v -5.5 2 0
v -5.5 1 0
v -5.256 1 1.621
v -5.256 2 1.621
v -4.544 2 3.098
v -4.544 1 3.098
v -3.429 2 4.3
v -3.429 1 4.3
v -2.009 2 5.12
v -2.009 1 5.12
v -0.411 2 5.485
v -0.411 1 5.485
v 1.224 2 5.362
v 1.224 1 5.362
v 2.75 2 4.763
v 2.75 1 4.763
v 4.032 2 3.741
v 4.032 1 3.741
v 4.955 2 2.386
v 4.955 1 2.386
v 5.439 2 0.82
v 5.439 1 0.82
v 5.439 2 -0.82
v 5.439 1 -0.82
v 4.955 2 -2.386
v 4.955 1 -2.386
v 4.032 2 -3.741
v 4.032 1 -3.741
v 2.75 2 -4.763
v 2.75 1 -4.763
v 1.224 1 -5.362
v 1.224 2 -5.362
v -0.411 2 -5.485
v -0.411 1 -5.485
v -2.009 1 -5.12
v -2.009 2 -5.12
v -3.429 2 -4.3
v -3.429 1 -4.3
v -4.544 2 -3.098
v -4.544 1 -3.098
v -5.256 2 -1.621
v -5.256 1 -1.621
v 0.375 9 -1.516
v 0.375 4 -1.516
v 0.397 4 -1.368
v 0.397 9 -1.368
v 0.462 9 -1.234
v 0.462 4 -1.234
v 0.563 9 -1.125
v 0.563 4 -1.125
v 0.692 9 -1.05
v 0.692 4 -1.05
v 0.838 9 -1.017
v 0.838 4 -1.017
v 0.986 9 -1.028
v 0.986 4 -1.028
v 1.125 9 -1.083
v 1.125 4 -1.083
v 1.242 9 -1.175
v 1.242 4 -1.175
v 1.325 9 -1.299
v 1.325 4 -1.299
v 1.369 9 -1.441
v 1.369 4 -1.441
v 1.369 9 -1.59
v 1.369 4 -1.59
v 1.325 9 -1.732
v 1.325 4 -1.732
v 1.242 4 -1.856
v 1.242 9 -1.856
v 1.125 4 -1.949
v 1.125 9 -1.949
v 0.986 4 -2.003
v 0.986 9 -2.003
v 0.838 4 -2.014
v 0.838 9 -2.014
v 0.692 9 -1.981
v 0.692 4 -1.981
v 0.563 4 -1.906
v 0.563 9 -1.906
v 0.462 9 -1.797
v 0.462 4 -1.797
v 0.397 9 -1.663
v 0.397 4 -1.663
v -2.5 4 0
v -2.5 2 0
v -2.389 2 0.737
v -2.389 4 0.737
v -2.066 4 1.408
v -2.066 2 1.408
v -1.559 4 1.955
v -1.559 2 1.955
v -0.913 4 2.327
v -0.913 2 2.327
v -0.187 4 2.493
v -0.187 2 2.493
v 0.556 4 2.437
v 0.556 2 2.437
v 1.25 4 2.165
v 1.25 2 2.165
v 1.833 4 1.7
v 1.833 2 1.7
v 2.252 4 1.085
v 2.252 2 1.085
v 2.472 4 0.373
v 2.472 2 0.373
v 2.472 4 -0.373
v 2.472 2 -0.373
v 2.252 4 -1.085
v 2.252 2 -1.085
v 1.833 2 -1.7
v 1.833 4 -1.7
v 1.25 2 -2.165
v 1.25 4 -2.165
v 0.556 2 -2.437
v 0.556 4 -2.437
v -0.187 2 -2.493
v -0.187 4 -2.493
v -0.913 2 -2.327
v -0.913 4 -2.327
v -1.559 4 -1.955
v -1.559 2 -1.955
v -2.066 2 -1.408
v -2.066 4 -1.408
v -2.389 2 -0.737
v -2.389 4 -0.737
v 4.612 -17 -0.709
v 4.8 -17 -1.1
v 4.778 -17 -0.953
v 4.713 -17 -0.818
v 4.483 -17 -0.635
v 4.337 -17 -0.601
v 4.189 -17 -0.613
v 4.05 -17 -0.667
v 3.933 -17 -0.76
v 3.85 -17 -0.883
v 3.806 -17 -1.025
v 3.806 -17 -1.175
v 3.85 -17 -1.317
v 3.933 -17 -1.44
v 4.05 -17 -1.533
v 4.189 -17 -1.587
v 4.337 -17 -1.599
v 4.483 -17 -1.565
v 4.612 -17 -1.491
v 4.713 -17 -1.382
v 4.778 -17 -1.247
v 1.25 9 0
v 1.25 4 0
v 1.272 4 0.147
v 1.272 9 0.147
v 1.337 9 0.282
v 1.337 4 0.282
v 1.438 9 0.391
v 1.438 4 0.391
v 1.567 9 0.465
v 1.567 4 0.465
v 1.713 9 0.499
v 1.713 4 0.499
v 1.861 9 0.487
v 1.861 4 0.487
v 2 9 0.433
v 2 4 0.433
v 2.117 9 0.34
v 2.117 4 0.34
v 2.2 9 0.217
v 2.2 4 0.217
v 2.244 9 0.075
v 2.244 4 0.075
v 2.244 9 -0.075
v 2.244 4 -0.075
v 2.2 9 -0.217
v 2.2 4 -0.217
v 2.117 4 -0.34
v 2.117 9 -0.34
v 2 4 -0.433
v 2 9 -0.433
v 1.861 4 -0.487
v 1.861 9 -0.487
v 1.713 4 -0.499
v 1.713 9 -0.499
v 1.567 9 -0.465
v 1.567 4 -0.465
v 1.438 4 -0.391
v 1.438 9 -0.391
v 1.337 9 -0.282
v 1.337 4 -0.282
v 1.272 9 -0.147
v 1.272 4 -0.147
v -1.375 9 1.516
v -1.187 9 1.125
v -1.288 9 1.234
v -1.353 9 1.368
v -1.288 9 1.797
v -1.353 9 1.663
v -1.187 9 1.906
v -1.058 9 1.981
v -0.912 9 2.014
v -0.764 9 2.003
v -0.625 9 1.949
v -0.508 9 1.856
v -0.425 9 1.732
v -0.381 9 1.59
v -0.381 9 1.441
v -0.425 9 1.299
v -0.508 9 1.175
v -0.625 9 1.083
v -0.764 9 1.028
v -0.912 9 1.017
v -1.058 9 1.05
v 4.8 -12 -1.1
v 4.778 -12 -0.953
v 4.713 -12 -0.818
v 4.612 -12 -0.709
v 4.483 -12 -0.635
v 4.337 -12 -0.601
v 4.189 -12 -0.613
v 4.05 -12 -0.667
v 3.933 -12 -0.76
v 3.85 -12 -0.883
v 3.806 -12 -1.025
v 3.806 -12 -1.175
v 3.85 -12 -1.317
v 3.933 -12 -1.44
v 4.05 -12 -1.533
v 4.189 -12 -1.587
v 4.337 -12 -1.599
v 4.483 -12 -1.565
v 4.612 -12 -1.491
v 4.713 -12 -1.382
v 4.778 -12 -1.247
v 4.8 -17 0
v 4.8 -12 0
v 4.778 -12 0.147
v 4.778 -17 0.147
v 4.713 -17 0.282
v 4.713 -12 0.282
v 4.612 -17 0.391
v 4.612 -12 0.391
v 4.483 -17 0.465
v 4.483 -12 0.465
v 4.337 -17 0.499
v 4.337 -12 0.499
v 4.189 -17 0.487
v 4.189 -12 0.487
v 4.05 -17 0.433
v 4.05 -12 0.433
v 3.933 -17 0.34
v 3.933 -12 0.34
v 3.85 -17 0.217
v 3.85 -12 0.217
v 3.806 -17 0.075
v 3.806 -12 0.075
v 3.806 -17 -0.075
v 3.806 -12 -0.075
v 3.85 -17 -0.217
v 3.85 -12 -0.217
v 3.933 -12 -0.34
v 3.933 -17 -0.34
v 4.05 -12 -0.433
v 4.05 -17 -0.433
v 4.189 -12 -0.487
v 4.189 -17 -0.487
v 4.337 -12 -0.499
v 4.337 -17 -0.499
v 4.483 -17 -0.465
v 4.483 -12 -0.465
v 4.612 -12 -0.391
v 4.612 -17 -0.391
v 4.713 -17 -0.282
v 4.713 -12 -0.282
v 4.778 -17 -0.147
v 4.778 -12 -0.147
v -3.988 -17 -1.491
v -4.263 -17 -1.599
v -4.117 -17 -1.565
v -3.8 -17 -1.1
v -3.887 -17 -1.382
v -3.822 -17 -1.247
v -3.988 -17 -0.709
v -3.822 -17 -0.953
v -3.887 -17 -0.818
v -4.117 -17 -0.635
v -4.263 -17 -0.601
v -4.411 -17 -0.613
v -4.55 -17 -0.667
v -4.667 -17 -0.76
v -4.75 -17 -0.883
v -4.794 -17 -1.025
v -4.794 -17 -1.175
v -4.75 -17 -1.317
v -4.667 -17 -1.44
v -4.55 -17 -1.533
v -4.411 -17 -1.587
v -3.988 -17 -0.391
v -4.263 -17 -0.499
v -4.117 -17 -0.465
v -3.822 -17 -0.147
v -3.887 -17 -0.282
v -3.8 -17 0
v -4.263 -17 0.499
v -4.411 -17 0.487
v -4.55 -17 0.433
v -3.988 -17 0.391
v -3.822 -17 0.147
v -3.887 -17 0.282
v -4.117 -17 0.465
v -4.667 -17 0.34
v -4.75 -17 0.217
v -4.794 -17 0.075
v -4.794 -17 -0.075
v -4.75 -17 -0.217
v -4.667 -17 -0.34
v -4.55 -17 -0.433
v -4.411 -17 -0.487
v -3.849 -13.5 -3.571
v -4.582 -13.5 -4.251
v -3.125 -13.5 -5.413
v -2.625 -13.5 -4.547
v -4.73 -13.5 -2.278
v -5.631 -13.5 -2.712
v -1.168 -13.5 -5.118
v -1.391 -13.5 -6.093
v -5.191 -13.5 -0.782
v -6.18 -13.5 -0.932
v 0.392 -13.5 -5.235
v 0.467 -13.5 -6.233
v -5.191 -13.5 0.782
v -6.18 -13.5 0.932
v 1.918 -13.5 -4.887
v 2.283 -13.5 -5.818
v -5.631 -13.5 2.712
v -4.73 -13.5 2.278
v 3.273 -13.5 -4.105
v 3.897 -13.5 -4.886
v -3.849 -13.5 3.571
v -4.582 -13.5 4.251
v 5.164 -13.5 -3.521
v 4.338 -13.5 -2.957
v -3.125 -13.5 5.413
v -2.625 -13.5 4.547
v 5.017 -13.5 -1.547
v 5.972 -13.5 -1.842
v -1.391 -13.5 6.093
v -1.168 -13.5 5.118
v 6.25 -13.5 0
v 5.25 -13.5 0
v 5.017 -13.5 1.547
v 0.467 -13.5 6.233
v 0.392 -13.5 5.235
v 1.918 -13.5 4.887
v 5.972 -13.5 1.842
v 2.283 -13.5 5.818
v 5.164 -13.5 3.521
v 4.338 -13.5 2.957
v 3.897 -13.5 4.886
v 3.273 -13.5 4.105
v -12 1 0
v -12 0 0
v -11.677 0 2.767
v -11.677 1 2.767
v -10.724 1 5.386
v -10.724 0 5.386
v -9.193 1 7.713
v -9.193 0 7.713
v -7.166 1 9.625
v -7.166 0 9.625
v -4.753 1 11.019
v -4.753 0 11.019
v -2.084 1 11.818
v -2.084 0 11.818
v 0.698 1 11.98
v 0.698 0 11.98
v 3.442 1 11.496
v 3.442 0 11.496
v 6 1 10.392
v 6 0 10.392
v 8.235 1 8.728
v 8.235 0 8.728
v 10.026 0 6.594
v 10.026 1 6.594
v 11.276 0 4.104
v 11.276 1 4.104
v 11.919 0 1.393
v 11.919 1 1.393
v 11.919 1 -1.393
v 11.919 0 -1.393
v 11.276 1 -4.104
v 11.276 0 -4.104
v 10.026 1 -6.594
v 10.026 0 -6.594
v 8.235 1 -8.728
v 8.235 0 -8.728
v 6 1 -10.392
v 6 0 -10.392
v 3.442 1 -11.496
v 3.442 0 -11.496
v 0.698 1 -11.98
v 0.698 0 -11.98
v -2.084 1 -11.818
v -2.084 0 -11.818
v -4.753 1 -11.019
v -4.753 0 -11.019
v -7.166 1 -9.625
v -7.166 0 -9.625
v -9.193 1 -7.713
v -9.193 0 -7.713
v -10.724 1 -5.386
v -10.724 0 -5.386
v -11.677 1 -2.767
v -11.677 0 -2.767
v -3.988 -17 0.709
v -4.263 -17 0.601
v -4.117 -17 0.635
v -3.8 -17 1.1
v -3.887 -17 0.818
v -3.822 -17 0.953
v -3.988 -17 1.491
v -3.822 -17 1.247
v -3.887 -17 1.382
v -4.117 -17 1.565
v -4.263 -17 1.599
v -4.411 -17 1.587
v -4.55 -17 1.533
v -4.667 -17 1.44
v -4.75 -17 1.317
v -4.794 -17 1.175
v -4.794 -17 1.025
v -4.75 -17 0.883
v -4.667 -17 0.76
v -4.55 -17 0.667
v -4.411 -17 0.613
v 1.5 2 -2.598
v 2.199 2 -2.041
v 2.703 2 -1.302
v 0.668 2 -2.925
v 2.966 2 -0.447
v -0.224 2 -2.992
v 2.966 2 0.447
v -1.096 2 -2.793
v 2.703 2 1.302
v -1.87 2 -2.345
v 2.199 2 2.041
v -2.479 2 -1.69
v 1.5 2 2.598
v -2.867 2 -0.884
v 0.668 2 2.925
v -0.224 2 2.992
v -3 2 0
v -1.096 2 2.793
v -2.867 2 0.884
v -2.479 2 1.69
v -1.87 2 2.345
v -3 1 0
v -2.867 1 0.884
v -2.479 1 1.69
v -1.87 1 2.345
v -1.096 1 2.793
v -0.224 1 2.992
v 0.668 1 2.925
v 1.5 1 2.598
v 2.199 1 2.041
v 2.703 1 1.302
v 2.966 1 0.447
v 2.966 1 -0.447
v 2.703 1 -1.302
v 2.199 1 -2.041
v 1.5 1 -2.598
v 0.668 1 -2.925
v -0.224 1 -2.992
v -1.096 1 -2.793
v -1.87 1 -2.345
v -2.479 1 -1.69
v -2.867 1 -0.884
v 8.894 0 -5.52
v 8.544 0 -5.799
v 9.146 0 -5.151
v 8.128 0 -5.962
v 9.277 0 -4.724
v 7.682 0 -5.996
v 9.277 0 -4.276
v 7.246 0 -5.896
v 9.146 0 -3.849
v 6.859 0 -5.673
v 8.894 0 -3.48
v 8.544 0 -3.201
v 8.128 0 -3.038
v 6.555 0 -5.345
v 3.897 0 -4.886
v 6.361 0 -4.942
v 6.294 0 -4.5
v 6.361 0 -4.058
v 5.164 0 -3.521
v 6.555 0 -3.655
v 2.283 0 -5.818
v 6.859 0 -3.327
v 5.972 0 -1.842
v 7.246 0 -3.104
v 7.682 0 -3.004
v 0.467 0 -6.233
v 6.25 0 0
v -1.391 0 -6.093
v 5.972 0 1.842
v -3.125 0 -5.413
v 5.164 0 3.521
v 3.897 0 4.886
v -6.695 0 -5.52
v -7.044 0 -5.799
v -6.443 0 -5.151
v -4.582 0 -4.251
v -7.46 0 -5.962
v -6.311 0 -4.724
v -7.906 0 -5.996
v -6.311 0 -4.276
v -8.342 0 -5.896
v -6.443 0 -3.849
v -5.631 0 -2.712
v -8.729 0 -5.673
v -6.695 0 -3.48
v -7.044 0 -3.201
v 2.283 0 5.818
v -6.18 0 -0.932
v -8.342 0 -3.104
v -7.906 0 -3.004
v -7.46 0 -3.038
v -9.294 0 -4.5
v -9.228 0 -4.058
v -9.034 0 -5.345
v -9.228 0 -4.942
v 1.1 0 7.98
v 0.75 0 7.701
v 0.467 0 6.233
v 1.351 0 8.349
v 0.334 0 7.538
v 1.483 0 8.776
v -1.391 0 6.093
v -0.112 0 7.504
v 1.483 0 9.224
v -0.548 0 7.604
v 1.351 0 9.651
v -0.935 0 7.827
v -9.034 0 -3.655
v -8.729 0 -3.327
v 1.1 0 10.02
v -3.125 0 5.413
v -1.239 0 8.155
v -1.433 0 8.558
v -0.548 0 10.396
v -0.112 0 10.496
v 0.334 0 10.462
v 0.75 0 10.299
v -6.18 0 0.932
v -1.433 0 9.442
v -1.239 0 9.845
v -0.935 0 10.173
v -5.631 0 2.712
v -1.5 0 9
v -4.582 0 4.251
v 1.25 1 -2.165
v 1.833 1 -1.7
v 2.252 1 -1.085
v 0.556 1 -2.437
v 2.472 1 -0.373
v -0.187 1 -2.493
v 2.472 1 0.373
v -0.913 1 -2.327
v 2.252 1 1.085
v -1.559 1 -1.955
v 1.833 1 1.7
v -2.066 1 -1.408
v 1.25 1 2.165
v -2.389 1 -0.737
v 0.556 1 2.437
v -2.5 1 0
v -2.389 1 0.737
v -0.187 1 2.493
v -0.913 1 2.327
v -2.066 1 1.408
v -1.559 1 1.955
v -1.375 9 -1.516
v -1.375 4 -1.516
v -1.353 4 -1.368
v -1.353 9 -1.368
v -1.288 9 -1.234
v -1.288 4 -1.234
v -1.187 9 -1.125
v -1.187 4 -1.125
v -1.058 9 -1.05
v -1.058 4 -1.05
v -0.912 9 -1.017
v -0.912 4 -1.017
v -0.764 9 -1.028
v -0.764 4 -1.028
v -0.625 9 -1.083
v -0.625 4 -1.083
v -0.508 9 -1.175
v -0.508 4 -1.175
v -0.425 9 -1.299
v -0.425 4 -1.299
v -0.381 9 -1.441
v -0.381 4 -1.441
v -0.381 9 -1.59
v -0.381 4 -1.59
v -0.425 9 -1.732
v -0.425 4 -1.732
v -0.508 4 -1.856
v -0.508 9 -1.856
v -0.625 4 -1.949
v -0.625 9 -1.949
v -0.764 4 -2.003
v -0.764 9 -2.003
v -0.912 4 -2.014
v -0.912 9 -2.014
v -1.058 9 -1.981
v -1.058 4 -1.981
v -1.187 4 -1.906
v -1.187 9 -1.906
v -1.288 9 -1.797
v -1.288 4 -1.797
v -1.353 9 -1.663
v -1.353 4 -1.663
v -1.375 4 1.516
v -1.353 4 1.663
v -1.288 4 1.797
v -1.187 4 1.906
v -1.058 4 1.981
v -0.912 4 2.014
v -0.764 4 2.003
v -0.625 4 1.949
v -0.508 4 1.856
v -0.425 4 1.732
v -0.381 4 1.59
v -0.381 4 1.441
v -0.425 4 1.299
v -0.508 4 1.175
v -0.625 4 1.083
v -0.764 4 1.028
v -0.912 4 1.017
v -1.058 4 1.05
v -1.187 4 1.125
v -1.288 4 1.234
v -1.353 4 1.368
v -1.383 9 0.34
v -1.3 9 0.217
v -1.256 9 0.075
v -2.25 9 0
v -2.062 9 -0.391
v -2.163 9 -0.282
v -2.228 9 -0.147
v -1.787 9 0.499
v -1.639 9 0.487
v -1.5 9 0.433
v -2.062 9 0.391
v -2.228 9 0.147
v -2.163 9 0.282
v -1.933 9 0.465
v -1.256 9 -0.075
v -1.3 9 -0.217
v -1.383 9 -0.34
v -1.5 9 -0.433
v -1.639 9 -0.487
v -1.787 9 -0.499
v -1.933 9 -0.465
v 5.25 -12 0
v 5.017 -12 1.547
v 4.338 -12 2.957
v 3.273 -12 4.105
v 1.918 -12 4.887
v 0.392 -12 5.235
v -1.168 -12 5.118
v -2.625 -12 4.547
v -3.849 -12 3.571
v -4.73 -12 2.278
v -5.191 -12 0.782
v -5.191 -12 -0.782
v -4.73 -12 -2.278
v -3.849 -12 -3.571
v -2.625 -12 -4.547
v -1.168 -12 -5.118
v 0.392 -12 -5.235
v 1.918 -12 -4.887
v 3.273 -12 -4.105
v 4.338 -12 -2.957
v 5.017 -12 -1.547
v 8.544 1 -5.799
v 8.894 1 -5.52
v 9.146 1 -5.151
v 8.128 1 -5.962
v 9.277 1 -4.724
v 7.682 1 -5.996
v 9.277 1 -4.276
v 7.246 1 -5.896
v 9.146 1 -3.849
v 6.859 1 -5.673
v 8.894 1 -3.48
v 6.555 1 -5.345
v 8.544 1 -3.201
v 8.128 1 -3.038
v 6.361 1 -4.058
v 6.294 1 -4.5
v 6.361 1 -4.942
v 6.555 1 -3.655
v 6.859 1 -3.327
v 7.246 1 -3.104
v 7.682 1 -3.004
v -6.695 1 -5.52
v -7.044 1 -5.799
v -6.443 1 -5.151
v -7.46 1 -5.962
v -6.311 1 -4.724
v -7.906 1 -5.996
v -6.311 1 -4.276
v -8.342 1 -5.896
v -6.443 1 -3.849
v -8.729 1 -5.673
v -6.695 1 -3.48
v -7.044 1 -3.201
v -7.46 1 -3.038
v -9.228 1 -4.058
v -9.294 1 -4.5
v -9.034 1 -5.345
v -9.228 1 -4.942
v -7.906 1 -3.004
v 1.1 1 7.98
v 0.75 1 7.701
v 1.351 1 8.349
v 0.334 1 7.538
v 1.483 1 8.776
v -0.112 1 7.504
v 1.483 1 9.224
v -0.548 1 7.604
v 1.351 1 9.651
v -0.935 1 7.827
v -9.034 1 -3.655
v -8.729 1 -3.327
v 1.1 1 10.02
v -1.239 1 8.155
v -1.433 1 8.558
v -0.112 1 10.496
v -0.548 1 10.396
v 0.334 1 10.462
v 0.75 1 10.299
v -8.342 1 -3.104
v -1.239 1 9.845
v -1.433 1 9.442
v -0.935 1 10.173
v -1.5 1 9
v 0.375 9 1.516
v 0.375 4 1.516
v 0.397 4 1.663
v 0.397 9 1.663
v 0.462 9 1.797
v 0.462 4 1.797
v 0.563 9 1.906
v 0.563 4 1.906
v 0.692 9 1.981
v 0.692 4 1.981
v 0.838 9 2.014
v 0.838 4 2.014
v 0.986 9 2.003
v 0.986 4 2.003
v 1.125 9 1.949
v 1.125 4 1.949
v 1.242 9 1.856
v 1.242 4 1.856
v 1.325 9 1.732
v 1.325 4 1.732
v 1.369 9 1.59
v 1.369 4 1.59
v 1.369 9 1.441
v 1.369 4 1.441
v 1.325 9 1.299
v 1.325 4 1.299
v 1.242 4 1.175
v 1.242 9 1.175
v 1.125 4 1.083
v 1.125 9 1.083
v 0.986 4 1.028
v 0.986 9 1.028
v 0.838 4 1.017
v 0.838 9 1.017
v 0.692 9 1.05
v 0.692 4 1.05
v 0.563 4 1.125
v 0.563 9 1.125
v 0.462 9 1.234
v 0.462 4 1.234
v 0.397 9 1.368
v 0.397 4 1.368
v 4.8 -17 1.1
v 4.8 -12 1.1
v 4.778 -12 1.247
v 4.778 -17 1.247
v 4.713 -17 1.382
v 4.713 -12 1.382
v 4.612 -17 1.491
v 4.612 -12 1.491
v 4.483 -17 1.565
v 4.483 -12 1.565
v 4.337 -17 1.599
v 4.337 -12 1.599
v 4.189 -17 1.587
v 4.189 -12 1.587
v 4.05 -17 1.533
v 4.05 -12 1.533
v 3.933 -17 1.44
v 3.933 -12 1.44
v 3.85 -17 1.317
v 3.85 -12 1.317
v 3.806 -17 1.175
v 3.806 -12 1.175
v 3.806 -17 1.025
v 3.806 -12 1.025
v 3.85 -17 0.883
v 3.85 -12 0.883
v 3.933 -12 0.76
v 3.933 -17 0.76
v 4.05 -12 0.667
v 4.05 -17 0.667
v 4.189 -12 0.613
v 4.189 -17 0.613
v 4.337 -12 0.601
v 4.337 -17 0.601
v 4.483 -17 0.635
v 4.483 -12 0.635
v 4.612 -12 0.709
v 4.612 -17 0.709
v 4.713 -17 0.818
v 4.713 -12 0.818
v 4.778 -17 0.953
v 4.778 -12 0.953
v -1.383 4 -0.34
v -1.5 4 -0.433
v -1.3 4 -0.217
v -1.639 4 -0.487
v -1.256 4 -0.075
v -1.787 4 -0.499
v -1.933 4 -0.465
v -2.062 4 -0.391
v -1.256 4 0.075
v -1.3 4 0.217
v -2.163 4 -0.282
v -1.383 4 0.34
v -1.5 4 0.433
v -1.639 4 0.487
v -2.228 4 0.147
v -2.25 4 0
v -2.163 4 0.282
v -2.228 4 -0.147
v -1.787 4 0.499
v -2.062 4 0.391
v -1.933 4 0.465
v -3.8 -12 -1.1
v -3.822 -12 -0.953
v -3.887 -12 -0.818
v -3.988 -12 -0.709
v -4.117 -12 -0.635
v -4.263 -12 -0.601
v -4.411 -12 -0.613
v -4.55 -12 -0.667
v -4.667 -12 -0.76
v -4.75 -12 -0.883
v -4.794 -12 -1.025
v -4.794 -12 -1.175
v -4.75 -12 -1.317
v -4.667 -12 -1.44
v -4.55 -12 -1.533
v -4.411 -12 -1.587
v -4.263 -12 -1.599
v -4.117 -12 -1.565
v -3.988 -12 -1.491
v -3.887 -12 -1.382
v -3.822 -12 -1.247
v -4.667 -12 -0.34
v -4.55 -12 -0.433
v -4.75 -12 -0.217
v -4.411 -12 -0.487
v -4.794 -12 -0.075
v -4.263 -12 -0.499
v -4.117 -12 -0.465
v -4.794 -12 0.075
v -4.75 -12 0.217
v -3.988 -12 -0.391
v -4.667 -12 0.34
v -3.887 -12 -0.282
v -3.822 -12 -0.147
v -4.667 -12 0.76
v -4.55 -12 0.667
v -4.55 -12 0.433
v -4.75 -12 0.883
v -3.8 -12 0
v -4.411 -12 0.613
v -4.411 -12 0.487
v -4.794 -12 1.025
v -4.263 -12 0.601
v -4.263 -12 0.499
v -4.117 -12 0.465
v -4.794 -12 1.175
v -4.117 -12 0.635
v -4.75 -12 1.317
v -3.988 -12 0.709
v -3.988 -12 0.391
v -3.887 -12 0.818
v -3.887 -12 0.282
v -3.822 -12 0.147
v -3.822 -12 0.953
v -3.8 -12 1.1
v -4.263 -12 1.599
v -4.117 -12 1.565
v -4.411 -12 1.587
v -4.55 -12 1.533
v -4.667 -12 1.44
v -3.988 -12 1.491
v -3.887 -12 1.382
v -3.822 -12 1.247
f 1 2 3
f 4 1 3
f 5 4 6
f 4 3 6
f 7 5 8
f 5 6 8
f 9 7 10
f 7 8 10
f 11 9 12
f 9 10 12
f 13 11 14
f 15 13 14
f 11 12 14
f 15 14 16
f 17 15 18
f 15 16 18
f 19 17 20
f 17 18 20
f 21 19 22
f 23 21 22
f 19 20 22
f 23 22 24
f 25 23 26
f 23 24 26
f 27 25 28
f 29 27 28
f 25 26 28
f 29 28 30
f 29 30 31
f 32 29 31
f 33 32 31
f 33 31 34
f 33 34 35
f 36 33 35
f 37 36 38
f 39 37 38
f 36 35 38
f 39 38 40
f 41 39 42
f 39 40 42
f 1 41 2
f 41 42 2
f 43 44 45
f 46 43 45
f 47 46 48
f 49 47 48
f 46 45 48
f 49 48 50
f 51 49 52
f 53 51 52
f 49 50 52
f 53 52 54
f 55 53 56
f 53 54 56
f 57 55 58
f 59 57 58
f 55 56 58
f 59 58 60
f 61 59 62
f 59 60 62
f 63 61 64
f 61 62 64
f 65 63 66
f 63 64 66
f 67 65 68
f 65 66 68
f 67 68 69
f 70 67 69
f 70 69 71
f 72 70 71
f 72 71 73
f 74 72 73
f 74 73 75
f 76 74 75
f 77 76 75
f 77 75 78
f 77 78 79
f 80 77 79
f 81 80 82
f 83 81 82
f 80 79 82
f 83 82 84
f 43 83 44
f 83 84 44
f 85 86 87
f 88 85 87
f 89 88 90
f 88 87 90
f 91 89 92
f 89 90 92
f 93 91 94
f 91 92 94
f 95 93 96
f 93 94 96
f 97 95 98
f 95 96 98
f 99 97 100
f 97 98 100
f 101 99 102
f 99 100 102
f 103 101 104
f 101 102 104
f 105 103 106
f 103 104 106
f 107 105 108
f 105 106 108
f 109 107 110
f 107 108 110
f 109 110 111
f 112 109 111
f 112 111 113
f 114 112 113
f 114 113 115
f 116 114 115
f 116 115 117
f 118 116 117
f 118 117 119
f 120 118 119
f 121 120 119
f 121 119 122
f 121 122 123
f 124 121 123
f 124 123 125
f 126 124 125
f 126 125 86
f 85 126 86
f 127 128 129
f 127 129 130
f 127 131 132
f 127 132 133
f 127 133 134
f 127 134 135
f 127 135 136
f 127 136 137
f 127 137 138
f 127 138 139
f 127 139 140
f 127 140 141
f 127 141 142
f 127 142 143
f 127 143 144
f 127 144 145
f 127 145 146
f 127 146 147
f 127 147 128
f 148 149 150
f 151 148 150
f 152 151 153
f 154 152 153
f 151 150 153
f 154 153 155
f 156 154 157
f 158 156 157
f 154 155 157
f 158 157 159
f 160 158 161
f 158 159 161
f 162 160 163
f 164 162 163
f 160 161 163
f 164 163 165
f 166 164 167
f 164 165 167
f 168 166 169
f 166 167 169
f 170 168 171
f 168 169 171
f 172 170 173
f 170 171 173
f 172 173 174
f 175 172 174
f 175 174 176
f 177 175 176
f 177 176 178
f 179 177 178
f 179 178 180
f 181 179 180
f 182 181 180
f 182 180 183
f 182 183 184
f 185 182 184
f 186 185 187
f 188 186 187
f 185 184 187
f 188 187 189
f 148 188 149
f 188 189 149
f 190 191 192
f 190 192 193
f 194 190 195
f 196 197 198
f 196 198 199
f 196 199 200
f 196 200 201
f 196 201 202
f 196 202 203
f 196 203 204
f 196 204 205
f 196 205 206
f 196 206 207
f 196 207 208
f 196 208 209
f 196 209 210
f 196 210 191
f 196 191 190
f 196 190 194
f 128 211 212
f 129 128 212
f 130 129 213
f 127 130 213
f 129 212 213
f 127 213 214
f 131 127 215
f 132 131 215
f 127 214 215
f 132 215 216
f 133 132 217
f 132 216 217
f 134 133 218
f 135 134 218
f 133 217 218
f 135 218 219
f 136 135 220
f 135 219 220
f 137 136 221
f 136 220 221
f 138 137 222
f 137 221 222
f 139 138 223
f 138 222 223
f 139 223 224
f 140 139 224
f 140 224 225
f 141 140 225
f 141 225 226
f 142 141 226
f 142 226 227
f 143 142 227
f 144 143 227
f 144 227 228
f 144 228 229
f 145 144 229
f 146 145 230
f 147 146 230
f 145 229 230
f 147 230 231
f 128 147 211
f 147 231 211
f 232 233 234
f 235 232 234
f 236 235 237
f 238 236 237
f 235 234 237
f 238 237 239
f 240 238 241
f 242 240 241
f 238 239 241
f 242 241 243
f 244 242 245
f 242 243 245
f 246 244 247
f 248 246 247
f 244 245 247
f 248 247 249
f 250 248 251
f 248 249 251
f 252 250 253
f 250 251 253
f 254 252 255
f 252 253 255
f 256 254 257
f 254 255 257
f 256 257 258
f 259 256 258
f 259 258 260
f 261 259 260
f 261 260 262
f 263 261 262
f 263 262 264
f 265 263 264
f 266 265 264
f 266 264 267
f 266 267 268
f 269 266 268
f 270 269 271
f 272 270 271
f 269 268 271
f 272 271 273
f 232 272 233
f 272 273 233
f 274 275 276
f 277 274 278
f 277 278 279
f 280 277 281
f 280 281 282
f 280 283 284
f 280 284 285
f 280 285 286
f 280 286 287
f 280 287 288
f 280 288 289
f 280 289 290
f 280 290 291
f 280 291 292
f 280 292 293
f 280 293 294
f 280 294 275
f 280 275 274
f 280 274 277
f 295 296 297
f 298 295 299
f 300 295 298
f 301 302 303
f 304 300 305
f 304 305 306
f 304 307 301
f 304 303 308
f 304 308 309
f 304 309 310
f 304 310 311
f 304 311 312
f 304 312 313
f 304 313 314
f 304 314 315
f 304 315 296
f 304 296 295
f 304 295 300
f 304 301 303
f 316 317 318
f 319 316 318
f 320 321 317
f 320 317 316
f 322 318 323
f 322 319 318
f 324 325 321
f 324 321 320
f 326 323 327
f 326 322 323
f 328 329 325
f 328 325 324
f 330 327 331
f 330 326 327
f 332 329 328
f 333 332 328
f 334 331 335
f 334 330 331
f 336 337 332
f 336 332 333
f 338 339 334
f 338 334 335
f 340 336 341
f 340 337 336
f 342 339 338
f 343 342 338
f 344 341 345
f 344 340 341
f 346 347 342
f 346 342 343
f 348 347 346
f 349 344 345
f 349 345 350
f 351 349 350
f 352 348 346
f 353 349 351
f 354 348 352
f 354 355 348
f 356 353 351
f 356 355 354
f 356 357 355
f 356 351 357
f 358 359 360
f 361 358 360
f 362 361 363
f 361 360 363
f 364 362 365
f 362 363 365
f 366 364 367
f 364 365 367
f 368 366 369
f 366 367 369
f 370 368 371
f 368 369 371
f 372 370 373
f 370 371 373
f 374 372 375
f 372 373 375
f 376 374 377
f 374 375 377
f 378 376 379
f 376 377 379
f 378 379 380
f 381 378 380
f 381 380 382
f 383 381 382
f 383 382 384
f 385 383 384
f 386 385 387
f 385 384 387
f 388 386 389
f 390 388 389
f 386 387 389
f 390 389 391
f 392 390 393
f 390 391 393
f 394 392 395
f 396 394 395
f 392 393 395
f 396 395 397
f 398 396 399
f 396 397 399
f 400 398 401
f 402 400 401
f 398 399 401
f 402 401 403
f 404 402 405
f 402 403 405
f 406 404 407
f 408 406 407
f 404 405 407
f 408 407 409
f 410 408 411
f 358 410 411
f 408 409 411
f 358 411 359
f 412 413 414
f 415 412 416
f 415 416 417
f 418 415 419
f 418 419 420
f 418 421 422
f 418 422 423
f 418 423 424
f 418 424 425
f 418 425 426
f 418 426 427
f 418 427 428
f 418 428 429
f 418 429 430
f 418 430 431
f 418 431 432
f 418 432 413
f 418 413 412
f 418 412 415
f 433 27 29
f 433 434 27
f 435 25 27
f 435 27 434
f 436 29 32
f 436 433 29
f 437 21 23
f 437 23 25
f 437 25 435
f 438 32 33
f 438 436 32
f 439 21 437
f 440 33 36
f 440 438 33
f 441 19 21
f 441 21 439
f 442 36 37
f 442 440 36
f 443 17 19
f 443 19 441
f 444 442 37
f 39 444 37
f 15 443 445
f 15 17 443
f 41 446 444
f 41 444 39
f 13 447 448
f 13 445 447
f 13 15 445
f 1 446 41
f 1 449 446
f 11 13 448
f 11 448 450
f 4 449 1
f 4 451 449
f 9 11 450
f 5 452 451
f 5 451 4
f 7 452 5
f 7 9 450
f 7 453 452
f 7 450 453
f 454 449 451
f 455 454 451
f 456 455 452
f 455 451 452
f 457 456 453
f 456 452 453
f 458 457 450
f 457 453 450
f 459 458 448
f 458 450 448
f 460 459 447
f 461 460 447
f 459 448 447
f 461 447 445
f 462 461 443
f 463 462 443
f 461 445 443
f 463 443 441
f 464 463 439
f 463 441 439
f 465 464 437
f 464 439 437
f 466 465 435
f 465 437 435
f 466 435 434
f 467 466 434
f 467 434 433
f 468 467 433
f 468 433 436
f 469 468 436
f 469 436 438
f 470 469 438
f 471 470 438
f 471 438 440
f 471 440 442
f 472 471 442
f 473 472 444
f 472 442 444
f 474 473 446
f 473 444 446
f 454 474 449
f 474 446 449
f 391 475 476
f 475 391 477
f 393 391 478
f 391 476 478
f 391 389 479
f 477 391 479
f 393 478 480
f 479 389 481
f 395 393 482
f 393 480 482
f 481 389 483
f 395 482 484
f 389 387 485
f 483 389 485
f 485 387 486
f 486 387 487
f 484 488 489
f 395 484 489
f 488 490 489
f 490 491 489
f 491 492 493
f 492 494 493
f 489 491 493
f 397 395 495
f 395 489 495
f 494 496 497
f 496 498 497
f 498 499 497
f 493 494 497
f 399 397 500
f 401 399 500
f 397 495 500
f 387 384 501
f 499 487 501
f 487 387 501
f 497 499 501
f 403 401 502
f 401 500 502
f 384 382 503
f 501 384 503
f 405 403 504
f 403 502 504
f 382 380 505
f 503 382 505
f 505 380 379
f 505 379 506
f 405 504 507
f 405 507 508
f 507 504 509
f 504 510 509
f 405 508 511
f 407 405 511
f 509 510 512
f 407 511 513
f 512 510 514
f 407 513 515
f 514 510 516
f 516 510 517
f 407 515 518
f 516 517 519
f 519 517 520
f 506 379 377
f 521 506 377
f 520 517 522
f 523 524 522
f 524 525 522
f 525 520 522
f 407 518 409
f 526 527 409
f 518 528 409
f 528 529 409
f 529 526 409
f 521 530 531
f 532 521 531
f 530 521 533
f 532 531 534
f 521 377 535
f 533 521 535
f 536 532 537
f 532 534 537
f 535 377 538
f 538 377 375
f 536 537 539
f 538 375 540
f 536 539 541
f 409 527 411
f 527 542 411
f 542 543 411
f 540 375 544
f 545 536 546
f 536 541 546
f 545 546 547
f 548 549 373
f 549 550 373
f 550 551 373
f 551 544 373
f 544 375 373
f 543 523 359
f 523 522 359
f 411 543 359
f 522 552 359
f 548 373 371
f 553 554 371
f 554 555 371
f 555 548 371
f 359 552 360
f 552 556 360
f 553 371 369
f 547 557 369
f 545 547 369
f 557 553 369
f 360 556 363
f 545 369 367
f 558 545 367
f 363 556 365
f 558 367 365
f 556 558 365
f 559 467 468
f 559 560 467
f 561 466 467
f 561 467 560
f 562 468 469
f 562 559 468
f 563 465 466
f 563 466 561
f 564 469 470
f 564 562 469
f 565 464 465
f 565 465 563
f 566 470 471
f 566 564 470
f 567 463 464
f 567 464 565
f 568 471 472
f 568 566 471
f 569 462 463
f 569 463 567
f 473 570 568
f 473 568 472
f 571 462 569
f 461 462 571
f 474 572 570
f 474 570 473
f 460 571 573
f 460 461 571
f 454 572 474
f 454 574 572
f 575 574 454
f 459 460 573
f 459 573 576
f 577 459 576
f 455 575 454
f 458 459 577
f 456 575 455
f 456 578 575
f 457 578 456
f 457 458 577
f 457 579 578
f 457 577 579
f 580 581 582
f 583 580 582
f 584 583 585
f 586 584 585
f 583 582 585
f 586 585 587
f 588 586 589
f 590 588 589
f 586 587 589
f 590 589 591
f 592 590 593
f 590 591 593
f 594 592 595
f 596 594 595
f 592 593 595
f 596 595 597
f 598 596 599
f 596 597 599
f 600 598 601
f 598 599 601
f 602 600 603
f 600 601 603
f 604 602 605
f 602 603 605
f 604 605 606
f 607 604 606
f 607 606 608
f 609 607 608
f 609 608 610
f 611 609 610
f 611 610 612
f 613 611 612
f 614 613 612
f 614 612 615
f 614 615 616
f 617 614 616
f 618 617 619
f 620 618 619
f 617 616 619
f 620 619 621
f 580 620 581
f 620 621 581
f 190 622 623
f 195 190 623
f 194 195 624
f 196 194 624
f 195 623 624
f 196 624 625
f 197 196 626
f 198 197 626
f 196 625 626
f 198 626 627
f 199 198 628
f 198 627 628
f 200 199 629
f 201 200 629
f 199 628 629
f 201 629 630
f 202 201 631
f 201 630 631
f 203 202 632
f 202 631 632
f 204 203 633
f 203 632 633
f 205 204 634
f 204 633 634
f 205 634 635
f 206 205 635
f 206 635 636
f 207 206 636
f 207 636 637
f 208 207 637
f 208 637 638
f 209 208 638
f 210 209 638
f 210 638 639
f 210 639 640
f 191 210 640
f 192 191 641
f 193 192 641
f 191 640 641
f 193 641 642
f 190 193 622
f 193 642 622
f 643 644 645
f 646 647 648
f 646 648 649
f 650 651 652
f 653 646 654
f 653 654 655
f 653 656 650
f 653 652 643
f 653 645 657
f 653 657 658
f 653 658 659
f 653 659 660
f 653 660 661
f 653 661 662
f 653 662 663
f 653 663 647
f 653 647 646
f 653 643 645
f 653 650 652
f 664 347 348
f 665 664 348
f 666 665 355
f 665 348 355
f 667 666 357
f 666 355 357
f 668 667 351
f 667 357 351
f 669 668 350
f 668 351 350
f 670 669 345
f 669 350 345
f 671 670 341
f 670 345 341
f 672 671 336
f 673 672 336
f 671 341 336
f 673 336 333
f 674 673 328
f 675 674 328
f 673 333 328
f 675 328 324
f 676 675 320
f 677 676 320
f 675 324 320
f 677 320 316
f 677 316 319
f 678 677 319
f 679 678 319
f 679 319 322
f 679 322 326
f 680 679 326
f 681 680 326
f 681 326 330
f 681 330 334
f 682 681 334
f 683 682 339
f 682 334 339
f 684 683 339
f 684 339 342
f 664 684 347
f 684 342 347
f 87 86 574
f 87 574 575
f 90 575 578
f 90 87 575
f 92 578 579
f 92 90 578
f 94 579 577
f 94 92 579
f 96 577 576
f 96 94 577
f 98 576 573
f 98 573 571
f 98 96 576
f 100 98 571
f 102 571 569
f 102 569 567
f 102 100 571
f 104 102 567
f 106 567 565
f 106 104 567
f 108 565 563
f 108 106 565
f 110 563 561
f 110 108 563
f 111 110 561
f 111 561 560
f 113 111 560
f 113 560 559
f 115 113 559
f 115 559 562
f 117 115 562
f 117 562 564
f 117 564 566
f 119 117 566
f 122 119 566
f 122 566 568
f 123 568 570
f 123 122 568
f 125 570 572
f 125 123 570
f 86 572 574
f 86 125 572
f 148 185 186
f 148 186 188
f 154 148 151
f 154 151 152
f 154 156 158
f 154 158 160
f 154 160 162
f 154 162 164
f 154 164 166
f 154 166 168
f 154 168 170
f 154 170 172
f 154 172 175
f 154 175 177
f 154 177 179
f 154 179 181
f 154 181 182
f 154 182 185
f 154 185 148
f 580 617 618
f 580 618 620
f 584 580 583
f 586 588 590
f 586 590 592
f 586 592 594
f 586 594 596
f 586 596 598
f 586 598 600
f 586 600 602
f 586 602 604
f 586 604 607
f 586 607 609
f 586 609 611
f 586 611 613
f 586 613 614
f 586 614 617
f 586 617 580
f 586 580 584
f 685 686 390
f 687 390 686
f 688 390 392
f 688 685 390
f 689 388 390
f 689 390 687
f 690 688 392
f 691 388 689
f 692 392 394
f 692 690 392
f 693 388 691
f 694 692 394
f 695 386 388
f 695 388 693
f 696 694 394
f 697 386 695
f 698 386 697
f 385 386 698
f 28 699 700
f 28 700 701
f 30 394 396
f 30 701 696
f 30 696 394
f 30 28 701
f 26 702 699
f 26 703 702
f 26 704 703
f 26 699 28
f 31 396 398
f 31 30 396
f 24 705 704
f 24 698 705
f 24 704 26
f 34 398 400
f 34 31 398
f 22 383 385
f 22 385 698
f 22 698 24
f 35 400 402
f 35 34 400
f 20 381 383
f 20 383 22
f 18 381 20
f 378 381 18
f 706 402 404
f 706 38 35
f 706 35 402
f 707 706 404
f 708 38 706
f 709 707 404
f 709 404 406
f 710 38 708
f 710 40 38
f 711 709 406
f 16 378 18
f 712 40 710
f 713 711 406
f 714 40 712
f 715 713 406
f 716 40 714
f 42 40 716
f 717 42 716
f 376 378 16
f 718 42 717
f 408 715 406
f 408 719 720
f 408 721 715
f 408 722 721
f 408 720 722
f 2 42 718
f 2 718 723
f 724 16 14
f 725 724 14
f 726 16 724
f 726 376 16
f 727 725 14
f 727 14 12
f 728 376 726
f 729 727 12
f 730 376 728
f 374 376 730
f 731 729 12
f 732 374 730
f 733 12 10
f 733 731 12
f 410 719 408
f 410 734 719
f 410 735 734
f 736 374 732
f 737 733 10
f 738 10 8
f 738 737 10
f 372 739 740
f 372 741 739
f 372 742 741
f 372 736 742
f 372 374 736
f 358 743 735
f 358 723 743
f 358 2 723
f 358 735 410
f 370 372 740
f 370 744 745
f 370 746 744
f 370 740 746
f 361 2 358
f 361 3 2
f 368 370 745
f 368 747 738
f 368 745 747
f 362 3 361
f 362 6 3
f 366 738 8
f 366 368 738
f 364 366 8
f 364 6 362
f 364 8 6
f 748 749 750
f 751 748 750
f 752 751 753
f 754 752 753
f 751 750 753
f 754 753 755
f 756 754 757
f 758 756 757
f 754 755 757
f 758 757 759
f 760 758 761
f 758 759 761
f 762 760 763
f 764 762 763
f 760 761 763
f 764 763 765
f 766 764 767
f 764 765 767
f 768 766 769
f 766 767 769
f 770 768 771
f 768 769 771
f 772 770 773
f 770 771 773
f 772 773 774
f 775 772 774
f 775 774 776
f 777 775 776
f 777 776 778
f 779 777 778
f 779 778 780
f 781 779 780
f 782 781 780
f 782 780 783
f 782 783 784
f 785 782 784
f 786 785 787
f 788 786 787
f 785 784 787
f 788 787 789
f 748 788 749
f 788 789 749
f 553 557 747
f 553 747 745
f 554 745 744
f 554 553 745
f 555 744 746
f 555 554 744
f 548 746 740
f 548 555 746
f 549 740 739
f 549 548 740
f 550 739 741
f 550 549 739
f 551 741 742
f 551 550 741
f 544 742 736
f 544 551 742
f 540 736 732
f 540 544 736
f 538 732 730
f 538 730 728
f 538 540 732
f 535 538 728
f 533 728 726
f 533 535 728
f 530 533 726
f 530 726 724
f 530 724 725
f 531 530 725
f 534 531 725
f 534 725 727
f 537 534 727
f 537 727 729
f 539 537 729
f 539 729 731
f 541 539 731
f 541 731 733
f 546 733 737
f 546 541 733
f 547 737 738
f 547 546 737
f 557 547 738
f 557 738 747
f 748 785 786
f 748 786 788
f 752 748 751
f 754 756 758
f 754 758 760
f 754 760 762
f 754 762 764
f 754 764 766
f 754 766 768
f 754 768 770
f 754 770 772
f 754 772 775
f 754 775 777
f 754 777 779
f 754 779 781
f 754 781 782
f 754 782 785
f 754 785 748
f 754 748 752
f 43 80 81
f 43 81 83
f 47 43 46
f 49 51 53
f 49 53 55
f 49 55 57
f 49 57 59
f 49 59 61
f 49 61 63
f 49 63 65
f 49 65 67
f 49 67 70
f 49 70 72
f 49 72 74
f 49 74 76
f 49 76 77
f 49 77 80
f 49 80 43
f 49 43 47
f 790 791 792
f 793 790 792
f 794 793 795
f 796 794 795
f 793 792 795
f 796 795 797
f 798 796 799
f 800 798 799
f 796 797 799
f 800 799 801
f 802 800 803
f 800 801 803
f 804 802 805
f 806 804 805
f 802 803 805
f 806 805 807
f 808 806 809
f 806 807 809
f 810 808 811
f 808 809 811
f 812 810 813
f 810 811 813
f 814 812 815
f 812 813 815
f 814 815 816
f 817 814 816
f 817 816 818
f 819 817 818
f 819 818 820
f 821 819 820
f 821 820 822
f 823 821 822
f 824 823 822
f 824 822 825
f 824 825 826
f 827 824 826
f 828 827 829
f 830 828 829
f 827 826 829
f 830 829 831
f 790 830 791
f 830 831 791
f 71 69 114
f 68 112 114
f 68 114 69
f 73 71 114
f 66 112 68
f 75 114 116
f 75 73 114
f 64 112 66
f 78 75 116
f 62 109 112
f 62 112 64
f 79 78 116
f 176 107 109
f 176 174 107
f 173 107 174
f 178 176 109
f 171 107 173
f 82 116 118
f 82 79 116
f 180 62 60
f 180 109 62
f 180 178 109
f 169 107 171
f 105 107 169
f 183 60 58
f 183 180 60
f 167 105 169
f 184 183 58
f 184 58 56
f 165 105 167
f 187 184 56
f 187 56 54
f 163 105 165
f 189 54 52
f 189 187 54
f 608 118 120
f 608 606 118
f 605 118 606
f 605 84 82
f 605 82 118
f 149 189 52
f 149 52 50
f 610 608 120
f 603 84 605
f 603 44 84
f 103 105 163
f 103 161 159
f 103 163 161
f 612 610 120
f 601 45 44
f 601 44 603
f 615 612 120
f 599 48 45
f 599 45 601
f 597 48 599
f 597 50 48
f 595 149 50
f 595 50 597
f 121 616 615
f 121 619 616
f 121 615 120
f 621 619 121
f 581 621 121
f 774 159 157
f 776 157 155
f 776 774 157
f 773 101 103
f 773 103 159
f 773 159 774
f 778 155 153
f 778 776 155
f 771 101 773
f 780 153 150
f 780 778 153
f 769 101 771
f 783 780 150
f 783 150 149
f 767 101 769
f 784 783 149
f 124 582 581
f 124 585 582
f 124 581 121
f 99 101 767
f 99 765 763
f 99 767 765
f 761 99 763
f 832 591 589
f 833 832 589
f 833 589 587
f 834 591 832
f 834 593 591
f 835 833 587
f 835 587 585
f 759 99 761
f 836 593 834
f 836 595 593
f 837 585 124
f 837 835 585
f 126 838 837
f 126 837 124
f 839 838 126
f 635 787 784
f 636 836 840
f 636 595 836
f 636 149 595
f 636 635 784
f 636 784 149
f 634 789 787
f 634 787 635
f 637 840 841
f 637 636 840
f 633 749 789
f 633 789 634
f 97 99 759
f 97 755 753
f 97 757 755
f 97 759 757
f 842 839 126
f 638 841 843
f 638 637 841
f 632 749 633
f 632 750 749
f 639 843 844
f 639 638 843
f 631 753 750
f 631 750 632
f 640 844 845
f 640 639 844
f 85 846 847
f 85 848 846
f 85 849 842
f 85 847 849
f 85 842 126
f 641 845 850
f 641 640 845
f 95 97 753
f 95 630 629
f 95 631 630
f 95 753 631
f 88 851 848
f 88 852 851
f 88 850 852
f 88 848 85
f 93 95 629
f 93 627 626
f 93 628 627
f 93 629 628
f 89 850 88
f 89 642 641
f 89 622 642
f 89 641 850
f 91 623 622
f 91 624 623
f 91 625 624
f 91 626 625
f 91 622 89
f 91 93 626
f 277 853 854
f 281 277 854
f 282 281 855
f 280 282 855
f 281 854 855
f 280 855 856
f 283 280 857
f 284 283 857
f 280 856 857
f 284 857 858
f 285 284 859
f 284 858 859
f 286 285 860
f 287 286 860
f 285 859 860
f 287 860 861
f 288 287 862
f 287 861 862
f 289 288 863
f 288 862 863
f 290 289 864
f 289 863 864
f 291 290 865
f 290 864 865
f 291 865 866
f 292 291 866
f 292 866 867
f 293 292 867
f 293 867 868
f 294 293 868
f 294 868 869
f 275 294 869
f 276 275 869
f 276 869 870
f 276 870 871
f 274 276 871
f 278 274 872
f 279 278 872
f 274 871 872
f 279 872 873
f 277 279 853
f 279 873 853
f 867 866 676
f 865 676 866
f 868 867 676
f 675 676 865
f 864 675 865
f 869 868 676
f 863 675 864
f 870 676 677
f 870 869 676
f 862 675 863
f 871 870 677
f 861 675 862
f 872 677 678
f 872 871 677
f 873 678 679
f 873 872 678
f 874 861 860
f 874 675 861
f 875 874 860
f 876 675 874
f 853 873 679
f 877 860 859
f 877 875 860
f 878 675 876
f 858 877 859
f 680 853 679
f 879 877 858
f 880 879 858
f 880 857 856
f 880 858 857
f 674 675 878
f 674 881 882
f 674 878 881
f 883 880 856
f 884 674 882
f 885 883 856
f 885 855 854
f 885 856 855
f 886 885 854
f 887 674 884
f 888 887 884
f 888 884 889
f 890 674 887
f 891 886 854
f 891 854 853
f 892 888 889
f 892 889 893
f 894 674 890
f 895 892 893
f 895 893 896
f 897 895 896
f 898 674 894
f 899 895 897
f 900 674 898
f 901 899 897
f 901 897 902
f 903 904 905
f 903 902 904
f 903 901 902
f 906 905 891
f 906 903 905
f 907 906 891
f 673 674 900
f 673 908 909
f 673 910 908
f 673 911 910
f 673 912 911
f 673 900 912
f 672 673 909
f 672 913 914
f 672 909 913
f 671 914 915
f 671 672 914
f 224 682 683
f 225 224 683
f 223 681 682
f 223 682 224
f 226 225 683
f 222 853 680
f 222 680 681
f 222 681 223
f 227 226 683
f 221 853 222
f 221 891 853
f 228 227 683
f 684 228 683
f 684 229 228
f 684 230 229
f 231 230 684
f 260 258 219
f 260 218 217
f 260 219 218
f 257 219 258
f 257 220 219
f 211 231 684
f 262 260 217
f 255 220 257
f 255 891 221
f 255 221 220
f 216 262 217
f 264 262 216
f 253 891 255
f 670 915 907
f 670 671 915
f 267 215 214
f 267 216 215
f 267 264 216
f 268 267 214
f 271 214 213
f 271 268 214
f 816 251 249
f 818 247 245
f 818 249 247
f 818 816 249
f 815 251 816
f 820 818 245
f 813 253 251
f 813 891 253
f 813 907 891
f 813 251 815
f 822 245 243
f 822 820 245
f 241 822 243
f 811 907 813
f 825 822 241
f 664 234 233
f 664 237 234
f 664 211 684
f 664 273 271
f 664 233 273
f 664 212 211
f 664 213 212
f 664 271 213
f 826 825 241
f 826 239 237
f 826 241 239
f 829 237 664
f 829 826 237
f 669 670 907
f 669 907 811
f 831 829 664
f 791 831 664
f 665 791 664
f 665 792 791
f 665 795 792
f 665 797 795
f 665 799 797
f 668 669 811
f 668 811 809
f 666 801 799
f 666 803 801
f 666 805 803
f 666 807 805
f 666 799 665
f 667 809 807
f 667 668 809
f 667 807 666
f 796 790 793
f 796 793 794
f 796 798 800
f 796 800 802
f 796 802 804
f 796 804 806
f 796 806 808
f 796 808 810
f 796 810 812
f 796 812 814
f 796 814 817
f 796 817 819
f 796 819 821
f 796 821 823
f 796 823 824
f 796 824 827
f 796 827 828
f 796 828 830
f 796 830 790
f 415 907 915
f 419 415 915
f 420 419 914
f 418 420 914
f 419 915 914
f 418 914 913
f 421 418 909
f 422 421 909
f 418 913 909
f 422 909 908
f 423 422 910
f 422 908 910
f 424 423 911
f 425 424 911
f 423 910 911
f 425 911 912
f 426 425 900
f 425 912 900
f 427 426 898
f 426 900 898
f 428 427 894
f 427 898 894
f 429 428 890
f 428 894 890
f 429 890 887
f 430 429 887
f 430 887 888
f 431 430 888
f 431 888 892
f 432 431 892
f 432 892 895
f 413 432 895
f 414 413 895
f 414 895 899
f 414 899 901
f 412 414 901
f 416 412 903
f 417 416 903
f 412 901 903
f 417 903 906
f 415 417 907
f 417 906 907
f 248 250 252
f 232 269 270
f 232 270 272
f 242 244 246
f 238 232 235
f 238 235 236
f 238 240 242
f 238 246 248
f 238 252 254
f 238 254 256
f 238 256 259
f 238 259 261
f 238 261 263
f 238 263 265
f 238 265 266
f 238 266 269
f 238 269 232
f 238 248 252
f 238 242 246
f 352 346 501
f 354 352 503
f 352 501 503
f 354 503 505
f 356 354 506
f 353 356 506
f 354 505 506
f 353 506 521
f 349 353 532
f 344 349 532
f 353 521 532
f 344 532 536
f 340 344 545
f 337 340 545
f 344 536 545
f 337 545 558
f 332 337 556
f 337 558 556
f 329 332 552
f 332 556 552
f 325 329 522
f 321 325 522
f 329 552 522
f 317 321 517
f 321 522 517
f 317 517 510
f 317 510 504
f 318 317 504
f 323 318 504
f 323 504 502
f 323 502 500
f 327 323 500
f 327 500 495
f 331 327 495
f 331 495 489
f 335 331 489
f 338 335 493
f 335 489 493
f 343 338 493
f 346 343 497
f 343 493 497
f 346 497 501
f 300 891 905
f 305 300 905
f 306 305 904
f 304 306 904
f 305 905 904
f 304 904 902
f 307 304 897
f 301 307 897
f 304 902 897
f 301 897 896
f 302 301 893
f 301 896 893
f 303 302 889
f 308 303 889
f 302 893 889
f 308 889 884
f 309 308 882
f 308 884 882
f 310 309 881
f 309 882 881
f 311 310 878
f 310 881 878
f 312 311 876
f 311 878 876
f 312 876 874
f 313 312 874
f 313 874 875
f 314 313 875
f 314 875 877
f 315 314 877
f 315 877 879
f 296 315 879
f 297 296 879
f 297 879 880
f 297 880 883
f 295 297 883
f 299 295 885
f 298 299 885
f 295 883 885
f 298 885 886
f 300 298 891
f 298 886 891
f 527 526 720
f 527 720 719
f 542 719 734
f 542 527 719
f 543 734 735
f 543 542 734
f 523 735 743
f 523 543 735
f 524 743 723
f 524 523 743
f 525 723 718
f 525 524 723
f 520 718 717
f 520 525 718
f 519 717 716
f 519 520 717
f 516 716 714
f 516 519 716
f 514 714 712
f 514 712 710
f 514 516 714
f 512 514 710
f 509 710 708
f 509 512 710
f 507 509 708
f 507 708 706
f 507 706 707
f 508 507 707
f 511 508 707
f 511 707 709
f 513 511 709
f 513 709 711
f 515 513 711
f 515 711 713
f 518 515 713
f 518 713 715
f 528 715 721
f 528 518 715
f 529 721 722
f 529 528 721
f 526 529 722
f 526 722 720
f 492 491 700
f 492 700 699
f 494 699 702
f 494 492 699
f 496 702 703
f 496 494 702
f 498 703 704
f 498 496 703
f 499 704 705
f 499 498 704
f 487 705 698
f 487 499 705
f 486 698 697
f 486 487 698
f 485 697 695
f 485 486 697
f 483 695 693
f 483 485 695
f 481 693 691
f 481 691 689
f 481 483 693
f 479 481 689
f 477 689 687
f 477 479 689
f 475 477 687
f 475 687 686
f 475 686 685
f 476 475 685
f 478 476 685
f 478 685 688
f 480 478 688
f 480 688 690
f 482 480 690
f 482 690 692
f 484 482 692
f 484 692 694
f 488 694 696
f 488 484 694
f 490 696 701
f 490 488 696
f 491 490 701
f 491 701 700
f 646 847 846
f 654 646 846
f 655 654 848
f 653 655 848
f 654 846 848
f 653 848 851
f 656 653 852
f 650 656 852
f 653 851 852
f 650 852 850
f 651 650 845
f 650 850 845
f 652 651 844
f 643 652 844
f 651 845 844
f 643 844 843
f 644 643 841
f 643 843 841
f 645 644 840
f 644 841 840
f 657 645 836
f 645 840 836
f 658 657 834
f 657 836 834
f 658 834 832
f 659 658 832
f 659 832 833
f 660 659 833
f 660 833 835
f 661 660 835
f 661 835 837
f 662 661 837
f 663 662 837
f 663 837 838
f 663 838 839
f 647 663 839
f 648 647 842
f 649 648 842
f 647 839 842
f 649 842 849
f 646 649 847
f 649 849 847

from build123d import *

# Parameters (mm, degrees)
F0_R      = 6.25
F1_DEPTH  = 13.5
F2_R      = 12
F2_R_2    = 1.5
F2_R_3    = 6.25
F3_DEPTH  = 1
F4_R      = 5.5
F4_R_2    = 2.5
F5_DEPTH  = 1
F6_DEPTH  = 3
F7_R      = 3
F7_R_2    = 2.5
F8_DEPTH  = 1
F9_R      = 5.25
F10_DEPTH = 1.5
F11_R     = 0.5
F12_DEPTH = 5
F13_R     = 0.5
F14_DEPTH = 5


with BuildPart() as f1:
    # F0 (on Front) → F1 (new body)
    with BuildSketch(Plane.XZ):
        Circle(F0_R)
    extrude(amount=F1_DEPTH)

    # F2 (on face) → F3 (join)
    with BuildSketch(Plane(origin=(0, 0, 0), x_dir=(-1, 0, 0), z_dir=(0, 1, 0))):
        Circle(F2_R)
        with Locations((-7.7942286341, -4.5)):
            Circle(F2_R_2, mode=Mode.SUBTRACT)
        with Locations((7.7942286341, -4.5)):
            Circle(F2_R_2, mode=Mode.SUBTRACT)
        Circle(F2_R_3, mode=Mode.SUBTRACT)
        with Locations((0, 9)):
            Circle(F2_R_2, mode=Mode.SUBTRACT)
        Circle(F2_R_3)
    extrude(amount=F3_DEPTH)

    # F4 (on face) → F5 (join)
    with BuildSketch(Plane(origin=(0, 1, 0), x_dir=(-1, 0, 0), z_dir=(0, 1, 0))):
        Circle(F4_R)
        Circle(F4_R_2, mode=Mode.SUBTRACT)
    extrude(amount=F5_DEPTH)

    # F6 (add): a face of the model
    f6_faces = [f1.faces().sort_by_distance(p)[0] for p in [
        (0, 1, 0),
    ]]
    extrude(f6_faces, amount=F6_DEPTH)

    # F7 (on face) → F8 (cut)
    with BuildSketch(Plane(origin=(0, 2, 0), x_dir=(-1, 0, 0), z_dir=(0, 1, 0))):
        Circle(F7_R)
        Circle(F7_R_2, mode=Mode.SUBTRACT)
    extrude(amount=-F8_DEPTH, mode=Mode.SUBTRACT)

    # F9 (on face) → F10 (cut)
    with BuildSketch(Plane.XZ.offset(13.5)):
        Circle(F9_R)
    extrude(amount=-F10_DEPTH, mode=Mode.SUBTRACT)

    # F11 (on face) → F12 (join)
    with BuildSketch(Plane.XZ.offset(12)):
        with Locations((-4.3, -1.1)):
            Circle(F11_R)
        with Locations((-4.3, 0)):
            Circle(F11_R)
        with Locations((-4.3, 1.1)):
            Circle(F11_R)
        with Locations((4.3, 1.1)):
            Circle(F11_R)
        with Locations((4.3, 0)):
            Circle(F11_R)
        with Locations((4.3, -1.1)):
            Circle(F11_R)
    extrude(amount=F12_DEPTH)

    # F13 (on face) → F14 (join)
    with BuildSketch(Plane(origin=(0, 4, 0), x_dir=(-1, 0, 0), z_dir=(0, 1, 0))):
        with Locations((-0.875, -1.5155444566)):
            Circle(F13_R)
        with Locations((0.875, -1.5155444566)):
            Circle(F13_R)
        with Locations((1.75, 0)):
            Circle(F13_R)
        with Locations((0.875, 1.5155444566)):
            Circle(F13_R)
        with Locations((-0.875, 1.5155444566)):
            Circle(F13_R)
        with Locations((-1.75, 0)):
            Circle(F13_R)
    extrude(amount=F14_DEPTH)


solid = f1.part
